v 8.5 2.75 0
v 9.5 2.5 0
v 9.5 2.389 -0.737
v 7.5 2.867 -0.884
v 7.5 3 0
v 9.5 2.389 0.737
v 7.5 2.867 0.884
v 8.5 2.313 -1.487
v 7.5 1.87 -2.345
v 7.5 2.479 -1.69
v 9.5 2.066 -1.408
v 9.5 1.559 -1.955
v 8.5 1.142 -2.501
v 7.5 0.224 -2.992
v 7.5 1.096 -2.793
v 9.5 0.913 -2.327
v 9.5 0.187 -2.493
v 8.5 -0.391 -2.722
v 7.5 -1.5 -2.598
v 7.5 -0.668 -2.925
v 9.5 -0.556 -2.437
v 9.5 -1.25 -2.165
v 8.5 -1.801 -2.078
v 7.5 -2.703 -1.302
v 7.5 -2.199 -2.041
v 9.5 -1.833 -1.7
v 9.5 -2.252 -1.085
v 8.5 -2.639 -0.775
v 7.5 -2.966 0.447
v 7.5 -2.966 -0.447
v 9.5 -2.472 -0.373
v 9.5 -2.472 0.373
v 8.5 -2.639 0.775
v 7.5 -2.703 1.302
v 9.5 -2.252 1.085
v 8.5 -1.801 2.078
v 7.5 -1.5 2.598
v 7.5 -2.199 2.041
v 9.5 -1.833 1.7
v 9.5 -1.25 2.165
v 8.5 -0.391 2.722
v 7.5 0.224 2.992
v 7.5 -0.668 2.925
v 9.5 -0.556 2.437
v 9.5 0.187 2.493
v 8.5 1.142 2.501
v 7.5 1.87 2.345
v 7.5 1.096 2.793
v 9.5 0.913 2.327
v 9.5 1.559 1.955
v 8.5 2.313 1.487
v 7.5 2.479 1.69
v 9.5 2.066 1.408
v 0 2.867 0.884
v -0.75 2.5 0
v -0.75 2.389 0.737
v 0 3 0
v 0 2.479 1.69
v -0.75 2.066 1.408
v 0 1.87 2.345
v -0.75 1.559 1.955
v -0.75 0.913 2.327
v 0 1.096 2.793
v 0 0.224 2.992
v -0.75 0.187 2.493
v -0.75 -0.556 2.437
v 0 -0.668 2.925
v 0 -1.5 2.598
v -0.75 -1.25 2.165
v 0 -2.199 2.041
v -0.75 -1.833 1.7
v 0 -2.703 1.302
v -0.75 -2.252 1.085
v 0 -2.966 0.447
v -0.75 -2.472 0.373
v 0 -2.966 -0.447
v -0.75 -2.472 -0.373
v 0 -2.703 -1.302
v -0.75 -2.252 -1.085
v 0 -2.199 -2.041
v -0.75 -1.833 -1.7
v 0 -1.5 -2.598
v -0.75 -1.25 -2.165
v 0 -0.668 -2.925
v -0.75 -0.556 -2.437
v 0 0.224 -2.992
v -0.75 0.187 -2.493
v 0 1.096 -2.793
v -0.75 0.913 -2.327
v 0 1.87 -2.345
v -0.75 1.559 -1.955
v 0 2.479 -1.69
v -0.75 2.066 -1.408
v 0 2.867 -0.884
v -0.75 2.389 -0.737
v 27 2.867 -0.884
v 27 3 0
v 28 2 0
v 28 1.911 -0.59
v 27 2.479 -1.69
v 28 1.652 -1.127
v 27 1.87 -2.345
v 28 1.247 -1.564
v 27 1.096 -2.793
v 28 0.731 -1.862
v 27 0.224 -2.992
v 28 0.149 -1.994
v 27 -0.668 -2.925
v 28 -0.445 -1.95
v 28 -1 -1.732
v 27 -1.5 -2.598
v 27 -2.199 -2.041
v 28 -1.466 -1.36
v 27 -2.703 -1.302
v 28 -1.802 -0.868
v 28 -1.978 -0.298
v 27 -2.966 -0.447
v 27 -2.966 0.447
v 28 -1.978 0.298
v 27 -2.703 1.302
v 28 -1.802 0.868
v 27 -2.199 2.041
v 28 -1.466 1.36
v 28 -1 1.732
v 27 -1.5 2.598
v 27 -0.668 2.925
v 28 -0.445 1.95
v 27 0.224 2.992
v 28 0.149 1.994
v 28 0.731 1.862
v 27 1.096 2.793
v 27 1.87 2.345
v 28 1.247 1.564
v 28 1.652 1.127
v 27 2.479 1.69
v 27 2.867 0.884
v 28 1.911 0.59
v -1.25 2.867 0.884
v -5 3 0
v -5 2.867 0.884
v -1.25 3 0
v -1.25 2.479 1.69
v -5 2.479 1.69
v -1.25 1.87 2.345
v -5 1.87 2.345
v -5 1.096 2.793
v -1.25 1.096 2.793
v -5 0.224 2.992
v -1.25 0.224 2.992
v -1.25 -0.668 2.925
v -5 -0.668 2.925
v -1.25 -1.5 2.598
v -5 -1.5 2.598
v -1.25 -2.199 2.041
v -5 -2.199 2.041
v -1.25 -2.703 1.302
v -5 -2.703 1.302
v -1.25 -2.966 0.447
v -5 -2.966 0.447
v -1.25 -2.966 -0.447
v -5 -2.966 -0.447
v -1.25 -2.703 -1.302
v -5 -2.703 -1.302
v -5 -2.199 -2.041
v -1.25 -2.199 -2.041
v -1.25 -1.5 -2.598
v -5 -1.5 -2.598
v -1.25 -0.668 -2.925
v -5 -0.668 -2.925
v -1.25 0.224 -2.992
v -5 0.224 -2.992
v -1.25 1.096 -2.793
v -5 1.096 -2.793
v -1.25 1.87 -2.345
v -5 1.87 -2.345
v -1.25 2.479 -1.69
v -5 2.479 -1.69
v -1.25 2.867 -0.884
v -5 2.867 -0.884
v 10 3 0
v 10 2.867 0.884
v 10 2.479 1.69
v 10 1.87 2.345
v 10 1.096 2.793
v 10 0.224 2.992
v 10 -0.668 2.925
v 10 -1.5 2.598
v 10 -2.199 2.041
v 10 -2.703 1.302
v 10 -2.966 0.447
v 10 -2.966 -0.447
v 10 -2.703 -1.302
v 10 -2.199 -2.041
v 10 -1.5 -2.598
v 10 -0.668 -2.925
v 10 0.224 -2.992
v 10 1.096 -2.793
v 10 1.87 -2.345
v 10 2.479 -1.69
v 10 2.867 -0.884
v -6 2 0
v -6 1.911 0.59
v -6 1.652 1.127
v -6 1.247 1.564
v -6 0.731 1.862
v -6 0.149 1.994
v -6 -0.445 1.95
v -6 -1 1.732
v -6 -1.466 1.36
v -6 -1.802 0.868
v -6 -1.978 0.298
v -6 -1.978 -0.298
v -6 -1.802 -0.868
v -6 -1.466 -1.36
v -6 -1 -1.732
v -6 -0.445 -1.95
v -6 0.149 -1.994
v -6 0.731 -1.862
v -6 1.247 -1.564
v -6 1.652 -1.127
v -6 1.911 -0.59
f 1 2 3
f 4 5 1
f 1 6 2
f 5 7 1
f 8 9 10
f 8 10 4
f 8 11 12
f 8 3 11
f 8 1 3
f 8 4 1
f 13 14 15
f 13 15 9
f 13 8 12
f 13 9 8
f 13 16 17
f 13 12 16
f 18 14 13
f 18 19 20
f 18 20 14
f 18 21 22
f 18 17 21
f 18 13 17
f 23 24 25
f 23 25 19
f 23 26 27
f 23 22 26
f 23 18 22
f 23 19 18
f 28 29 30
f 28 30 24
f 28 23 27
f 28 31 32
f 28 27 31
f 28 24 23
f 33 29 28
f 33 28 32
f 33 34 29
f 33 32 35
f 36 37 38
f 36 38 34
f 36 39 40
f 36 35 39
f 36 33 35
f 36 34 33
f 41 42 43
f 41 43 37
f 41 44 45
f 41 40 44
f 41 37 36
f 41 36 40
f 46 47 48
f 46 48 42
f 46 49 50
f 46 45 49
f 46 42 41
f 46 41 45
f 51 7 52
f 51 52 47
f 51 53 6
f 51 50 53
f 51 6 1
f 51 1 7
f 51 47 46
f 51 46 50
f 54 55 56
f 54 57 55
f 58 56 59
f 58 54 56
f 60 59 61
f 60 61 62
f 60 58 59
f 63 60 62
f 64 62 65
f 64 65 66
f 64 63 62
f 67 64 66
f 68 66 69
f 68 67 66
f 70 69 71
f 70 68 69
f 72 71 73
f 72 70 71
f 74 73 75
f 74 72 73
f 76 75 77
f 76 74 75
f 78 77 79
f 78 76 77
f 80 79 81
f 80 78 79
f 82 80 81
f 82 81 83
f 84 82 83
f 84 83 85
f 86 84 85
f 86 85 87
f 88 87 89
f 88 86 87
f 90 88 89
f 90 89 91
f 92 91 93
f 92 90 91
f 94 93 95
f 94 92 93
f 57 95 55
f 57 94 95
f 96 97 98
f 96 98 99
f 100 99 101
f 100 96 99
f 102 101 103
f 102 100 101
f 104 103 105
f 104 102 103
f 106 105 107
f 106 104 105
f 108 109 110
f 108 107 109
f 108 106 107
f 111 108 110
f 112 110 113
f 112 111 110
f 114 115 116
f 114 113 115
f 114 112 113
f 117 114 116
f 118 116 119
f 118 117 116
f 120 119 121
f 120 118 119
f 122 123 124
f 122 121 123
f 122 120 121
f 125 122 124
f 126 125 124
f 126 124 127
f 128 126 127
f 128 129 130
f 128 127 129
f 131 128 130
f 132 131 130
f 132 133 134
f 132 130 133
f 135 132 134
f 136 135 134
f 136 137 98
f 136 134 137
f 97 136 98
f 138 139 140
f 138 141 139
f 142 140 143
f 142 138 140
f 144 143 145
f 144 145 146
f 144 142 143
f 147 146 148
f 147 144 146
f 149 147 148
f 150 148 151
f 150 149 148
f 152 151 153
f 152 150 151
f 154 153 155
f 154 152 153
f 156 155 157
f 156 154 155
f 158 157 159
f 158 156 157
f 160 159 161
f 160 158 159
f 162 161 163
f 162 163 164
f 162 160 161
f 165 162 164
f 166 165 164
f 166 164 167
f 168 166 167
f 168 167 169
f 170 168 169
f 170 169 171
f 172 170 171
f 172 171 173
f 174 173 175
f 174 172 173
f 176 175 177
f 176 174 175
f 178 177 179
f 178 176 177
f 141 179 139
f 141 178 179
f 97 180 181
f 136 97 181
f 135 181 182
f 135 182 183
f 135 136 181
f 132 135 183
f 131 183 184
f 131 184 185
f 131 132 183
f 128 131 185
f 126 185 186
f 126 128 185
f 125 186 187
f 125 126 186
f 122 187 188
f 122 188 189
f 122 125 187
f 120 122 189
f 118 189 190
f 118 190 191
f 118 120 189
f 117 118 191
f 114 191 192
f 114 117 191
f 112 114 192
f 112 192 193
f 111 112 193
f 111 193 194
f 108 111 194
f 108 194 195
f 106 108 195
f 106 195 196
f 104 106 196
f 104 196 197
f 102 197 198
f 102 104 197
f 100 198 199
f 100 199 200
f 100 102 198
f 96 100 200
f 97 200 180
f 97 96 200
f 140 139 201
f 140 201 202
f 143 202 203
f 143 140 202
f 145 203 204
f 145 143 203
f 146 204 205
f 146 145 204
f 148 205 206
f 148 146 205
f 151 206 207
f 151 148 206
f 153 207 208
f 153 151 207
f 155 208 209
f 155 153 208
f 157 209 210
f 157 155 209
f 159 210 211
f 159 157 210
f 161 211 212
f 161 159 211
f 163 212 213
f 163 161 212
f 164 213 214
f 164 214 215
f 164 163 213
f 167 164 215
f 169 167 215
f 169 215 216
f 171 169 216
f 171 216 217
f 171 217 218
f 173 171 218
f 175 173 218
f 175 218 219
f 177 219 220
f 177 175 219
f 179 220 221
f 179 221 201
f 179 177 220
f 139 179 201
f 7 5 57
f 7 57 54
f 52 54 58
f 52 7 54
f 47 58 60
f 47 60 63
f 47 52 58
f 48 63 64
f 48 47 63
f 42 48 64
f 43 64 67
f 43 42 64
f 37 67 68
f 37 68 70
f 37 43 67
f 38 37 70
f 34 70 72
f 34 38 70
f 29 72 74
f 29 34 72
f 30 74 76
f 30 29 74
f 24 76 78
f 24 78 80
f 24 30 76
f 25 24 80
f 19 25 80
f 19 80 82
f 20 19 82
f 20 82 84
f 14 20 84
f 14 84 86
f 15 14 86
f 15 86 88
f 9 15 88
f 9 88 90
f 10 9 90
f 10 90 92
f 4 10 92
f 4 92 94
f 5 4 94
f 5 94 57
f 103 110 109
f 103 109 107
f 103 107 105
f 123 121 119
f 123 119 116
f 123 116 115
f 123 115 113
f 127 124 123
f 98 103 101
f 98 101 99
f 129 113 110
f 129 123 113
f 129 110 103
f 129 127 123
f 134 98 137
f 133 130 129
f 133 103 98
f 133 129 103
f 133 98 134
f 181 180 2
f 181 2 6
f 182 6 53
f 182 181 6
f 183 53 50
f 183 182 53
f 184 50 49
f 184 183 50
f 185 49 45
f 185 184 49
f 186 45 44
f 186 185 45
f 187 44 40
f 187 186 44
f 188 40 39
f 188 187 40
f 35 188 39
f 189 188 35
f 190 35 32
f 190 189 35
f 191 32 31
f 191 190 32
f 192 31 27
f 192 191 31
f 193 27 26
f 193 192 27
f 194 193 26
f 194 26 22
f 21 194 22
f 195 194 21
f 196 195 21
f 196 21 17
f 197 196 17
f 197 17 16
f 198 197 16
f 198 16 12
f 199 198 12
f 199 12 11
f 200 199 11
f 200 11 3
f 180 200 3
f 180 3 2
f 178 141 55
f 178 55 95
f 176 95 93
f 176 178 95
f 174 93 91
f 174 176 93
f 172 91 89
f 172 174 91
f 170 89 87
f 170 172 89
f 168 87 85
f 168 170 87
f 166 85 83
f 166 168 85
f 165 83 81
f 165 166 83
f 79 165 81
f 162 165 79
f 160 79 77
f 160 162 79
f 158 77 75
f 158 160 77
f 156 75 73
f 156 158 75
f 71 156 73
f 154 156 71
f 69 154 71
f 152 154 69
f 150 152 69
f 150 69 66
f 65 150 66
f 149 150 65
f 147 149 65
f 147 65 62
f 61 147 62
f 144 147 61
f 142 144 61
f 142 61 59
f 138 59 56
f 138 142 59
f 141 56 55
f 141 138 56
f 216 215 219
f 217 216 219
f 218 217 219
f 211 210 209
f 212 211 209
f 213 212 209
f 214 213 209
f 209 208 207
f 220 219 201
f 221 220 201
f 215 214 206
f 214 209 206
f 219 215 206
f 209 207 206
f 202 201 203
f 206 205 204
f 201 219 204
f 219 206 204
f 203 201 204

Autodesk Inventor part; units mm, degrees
ref_plane "YZ Plane" through (0, 0, 0) normal (1, 0, 0) x (0, 1, 0)
ref_plane "XZ Plane" through (0, 0, 0) normal (0, 1, 0) x (-1, 0, 0)
sketch "Szkic1" plane through (0, 0, 0) normal (0, 0, 1) x (1, 0, 0)
  line L0 (28, 3) -> (28, 0)
  line L1 (-6, 0) -> (28, 0)
  line L2 (-12.8, 0) -> (34.8, 0) projected
  line L3 (0, 3.6) -> (0, -0.6) projected
  line L4 (-6, 3) -> (-6, 0)
  line L5 (10, 3) -> (10, 0) construction
  line L6 (-12.8, 0) -> (34.8, 0) projected
  line L7 (-6, 3) -> (28, 3)
  dimension "d4" = 6
  dimension "d5" = 28
  dimension "d6" = 18
  dimension "d13" = 6
revolve "Bryła" add sketch "Szkic1" angle 360 about axis through (-6, 0, 0) along (1, 0, 0)
thread "Gwint1" size "M6x1" class "6g" standard "ISO Metric profile" length 6
thread "Gwint2" size "M6x1" class "6g" standard "ISO Metric profile" length 18
chamfer "Faza1" distance 1 angle 45 1 edges at (-6, -3, 0) measured on face at (16.6667, 2.9903, -0.2414)
chamfer "Faza2" distance 1 angle 45 1 edges at (28, -3, 0) measured on face at (6, 2.9612, -0.4812)
sketch "Sketch5" plane through (0, 0, 0) normal (0, 0, 1) x (1, 0, 0)
  line L0 (-5, 3) -> (27, 3) projected
  line L1 (-5, -3) -> (27, -3) projected
  line L2 (28, 2) -> (28, -2) projected
  line L3 (-6, -2) -> (-6, 2) projected
  line L4 (10, 3) -> (9.5, 2.5)
  line L5 (9.5, 2.5) -> (7.5, 3)
  line L6 (-12.8, 0) -> (34.8, 0) projected
  point P0 (0, 0)
  dimension "d87" = 45
  dimension "d90" = 18
  dimension "d91" = 0.5
  dimension "d92" = 2.5
revolve "IDS_REVOLUTION{1}" cut sketch "Sketch5" angle 360 about axis through (-10, 0, 0) along (1, 0, 0)
sketch "Sketch6" plane through (0, 0, 0) normal (0, 0, 1) x (1, 0, 0)
  line L0 (-5, 3) -> (7.5, 3) projected
  line L1 (-6, -2) -> (-6, 2) projected
  line L2 (-1.25, 3) -> (-0.75, 2.5)
  line L3 (-0.75, 2.5) -> (0, 3)
  line L4 (-8.7, 0) -> (10.2, 0) projected
  point P0 (0, 0)
  dimension "d94" = 45
  dimension "d95" = 6
  dimension "d96" = 0.5
  dimension "d97" = 1.25
revolve "IDS_REVOLUTION{2}" cut sketch "Sketch6" angle 360 about axis through (-10, 0, 0) along (1, 0, 0)
ref_plane "Work Plane1" through (2.75, 0, 0) normal (0, -1, 0) x (1, 0, 0)
equation "\"d4\" = KOH"
equation "\"d5\" = NLG"
equation "\"d6\" = GEL"
equation "\"d13\" = GD"
equation "\"d1\" = KOH"
equation "\"d7\" = GEL"
equation "\"d9\" = -0.5 * SPD + 0.5 * GD"
equation "\"d10\" = -0.5 * SPD + 0.5 * GD"
equation "\"d11\" = -0.5 * SPD + 0.5 * GD"
equation "\"d12\" = -0.5 * SPD + 0.5 * GD"
equation "\"d90\" = GEL"
equation "\"d91\" = -0.25 * SPD + 0.25 * GD"
equation "\"d92\" = X1"
equation "\"d95\" = KOH"
equation "\"d96\" = -0.25 * SPD + 0.25 * GD"
equation "\"d97\" = X2"
equation "\"NLG\" = 28"
equation "\"GEL\" = 18"
equation "\"GAL\" = 0.61345 * PTC"
equation "\"SPD\" = 4"
equation "\"d0\" = GD"
equation "\"GUL\" = 0.61345 * PTC"
equation "\"KOH\" = 6"
equation "\"GD\" = 6"
equation "\"BDM\" = NND"
equation "\"GUL1\" = GUL"
equation "\"GAL1\" = GAL"
equation "\"d80\" = -GUL - GEL"
equation "\"d86\" = -KOH + GUL1"
equation "\"X1\" = 2.5"
equation "\"X2\" = 1.25"
equation "\"PTC\" = 1"
equation "\"THREADDIA\" = 6"
equation "\"TOA\" = 30deg"
equation "\"NND\" = 6"
equation "\"GD1\" = THREADDIA - 1.2269 * PTC"
properties part number "DIN 938 - M6 x 28" material "Stal, miękka"
